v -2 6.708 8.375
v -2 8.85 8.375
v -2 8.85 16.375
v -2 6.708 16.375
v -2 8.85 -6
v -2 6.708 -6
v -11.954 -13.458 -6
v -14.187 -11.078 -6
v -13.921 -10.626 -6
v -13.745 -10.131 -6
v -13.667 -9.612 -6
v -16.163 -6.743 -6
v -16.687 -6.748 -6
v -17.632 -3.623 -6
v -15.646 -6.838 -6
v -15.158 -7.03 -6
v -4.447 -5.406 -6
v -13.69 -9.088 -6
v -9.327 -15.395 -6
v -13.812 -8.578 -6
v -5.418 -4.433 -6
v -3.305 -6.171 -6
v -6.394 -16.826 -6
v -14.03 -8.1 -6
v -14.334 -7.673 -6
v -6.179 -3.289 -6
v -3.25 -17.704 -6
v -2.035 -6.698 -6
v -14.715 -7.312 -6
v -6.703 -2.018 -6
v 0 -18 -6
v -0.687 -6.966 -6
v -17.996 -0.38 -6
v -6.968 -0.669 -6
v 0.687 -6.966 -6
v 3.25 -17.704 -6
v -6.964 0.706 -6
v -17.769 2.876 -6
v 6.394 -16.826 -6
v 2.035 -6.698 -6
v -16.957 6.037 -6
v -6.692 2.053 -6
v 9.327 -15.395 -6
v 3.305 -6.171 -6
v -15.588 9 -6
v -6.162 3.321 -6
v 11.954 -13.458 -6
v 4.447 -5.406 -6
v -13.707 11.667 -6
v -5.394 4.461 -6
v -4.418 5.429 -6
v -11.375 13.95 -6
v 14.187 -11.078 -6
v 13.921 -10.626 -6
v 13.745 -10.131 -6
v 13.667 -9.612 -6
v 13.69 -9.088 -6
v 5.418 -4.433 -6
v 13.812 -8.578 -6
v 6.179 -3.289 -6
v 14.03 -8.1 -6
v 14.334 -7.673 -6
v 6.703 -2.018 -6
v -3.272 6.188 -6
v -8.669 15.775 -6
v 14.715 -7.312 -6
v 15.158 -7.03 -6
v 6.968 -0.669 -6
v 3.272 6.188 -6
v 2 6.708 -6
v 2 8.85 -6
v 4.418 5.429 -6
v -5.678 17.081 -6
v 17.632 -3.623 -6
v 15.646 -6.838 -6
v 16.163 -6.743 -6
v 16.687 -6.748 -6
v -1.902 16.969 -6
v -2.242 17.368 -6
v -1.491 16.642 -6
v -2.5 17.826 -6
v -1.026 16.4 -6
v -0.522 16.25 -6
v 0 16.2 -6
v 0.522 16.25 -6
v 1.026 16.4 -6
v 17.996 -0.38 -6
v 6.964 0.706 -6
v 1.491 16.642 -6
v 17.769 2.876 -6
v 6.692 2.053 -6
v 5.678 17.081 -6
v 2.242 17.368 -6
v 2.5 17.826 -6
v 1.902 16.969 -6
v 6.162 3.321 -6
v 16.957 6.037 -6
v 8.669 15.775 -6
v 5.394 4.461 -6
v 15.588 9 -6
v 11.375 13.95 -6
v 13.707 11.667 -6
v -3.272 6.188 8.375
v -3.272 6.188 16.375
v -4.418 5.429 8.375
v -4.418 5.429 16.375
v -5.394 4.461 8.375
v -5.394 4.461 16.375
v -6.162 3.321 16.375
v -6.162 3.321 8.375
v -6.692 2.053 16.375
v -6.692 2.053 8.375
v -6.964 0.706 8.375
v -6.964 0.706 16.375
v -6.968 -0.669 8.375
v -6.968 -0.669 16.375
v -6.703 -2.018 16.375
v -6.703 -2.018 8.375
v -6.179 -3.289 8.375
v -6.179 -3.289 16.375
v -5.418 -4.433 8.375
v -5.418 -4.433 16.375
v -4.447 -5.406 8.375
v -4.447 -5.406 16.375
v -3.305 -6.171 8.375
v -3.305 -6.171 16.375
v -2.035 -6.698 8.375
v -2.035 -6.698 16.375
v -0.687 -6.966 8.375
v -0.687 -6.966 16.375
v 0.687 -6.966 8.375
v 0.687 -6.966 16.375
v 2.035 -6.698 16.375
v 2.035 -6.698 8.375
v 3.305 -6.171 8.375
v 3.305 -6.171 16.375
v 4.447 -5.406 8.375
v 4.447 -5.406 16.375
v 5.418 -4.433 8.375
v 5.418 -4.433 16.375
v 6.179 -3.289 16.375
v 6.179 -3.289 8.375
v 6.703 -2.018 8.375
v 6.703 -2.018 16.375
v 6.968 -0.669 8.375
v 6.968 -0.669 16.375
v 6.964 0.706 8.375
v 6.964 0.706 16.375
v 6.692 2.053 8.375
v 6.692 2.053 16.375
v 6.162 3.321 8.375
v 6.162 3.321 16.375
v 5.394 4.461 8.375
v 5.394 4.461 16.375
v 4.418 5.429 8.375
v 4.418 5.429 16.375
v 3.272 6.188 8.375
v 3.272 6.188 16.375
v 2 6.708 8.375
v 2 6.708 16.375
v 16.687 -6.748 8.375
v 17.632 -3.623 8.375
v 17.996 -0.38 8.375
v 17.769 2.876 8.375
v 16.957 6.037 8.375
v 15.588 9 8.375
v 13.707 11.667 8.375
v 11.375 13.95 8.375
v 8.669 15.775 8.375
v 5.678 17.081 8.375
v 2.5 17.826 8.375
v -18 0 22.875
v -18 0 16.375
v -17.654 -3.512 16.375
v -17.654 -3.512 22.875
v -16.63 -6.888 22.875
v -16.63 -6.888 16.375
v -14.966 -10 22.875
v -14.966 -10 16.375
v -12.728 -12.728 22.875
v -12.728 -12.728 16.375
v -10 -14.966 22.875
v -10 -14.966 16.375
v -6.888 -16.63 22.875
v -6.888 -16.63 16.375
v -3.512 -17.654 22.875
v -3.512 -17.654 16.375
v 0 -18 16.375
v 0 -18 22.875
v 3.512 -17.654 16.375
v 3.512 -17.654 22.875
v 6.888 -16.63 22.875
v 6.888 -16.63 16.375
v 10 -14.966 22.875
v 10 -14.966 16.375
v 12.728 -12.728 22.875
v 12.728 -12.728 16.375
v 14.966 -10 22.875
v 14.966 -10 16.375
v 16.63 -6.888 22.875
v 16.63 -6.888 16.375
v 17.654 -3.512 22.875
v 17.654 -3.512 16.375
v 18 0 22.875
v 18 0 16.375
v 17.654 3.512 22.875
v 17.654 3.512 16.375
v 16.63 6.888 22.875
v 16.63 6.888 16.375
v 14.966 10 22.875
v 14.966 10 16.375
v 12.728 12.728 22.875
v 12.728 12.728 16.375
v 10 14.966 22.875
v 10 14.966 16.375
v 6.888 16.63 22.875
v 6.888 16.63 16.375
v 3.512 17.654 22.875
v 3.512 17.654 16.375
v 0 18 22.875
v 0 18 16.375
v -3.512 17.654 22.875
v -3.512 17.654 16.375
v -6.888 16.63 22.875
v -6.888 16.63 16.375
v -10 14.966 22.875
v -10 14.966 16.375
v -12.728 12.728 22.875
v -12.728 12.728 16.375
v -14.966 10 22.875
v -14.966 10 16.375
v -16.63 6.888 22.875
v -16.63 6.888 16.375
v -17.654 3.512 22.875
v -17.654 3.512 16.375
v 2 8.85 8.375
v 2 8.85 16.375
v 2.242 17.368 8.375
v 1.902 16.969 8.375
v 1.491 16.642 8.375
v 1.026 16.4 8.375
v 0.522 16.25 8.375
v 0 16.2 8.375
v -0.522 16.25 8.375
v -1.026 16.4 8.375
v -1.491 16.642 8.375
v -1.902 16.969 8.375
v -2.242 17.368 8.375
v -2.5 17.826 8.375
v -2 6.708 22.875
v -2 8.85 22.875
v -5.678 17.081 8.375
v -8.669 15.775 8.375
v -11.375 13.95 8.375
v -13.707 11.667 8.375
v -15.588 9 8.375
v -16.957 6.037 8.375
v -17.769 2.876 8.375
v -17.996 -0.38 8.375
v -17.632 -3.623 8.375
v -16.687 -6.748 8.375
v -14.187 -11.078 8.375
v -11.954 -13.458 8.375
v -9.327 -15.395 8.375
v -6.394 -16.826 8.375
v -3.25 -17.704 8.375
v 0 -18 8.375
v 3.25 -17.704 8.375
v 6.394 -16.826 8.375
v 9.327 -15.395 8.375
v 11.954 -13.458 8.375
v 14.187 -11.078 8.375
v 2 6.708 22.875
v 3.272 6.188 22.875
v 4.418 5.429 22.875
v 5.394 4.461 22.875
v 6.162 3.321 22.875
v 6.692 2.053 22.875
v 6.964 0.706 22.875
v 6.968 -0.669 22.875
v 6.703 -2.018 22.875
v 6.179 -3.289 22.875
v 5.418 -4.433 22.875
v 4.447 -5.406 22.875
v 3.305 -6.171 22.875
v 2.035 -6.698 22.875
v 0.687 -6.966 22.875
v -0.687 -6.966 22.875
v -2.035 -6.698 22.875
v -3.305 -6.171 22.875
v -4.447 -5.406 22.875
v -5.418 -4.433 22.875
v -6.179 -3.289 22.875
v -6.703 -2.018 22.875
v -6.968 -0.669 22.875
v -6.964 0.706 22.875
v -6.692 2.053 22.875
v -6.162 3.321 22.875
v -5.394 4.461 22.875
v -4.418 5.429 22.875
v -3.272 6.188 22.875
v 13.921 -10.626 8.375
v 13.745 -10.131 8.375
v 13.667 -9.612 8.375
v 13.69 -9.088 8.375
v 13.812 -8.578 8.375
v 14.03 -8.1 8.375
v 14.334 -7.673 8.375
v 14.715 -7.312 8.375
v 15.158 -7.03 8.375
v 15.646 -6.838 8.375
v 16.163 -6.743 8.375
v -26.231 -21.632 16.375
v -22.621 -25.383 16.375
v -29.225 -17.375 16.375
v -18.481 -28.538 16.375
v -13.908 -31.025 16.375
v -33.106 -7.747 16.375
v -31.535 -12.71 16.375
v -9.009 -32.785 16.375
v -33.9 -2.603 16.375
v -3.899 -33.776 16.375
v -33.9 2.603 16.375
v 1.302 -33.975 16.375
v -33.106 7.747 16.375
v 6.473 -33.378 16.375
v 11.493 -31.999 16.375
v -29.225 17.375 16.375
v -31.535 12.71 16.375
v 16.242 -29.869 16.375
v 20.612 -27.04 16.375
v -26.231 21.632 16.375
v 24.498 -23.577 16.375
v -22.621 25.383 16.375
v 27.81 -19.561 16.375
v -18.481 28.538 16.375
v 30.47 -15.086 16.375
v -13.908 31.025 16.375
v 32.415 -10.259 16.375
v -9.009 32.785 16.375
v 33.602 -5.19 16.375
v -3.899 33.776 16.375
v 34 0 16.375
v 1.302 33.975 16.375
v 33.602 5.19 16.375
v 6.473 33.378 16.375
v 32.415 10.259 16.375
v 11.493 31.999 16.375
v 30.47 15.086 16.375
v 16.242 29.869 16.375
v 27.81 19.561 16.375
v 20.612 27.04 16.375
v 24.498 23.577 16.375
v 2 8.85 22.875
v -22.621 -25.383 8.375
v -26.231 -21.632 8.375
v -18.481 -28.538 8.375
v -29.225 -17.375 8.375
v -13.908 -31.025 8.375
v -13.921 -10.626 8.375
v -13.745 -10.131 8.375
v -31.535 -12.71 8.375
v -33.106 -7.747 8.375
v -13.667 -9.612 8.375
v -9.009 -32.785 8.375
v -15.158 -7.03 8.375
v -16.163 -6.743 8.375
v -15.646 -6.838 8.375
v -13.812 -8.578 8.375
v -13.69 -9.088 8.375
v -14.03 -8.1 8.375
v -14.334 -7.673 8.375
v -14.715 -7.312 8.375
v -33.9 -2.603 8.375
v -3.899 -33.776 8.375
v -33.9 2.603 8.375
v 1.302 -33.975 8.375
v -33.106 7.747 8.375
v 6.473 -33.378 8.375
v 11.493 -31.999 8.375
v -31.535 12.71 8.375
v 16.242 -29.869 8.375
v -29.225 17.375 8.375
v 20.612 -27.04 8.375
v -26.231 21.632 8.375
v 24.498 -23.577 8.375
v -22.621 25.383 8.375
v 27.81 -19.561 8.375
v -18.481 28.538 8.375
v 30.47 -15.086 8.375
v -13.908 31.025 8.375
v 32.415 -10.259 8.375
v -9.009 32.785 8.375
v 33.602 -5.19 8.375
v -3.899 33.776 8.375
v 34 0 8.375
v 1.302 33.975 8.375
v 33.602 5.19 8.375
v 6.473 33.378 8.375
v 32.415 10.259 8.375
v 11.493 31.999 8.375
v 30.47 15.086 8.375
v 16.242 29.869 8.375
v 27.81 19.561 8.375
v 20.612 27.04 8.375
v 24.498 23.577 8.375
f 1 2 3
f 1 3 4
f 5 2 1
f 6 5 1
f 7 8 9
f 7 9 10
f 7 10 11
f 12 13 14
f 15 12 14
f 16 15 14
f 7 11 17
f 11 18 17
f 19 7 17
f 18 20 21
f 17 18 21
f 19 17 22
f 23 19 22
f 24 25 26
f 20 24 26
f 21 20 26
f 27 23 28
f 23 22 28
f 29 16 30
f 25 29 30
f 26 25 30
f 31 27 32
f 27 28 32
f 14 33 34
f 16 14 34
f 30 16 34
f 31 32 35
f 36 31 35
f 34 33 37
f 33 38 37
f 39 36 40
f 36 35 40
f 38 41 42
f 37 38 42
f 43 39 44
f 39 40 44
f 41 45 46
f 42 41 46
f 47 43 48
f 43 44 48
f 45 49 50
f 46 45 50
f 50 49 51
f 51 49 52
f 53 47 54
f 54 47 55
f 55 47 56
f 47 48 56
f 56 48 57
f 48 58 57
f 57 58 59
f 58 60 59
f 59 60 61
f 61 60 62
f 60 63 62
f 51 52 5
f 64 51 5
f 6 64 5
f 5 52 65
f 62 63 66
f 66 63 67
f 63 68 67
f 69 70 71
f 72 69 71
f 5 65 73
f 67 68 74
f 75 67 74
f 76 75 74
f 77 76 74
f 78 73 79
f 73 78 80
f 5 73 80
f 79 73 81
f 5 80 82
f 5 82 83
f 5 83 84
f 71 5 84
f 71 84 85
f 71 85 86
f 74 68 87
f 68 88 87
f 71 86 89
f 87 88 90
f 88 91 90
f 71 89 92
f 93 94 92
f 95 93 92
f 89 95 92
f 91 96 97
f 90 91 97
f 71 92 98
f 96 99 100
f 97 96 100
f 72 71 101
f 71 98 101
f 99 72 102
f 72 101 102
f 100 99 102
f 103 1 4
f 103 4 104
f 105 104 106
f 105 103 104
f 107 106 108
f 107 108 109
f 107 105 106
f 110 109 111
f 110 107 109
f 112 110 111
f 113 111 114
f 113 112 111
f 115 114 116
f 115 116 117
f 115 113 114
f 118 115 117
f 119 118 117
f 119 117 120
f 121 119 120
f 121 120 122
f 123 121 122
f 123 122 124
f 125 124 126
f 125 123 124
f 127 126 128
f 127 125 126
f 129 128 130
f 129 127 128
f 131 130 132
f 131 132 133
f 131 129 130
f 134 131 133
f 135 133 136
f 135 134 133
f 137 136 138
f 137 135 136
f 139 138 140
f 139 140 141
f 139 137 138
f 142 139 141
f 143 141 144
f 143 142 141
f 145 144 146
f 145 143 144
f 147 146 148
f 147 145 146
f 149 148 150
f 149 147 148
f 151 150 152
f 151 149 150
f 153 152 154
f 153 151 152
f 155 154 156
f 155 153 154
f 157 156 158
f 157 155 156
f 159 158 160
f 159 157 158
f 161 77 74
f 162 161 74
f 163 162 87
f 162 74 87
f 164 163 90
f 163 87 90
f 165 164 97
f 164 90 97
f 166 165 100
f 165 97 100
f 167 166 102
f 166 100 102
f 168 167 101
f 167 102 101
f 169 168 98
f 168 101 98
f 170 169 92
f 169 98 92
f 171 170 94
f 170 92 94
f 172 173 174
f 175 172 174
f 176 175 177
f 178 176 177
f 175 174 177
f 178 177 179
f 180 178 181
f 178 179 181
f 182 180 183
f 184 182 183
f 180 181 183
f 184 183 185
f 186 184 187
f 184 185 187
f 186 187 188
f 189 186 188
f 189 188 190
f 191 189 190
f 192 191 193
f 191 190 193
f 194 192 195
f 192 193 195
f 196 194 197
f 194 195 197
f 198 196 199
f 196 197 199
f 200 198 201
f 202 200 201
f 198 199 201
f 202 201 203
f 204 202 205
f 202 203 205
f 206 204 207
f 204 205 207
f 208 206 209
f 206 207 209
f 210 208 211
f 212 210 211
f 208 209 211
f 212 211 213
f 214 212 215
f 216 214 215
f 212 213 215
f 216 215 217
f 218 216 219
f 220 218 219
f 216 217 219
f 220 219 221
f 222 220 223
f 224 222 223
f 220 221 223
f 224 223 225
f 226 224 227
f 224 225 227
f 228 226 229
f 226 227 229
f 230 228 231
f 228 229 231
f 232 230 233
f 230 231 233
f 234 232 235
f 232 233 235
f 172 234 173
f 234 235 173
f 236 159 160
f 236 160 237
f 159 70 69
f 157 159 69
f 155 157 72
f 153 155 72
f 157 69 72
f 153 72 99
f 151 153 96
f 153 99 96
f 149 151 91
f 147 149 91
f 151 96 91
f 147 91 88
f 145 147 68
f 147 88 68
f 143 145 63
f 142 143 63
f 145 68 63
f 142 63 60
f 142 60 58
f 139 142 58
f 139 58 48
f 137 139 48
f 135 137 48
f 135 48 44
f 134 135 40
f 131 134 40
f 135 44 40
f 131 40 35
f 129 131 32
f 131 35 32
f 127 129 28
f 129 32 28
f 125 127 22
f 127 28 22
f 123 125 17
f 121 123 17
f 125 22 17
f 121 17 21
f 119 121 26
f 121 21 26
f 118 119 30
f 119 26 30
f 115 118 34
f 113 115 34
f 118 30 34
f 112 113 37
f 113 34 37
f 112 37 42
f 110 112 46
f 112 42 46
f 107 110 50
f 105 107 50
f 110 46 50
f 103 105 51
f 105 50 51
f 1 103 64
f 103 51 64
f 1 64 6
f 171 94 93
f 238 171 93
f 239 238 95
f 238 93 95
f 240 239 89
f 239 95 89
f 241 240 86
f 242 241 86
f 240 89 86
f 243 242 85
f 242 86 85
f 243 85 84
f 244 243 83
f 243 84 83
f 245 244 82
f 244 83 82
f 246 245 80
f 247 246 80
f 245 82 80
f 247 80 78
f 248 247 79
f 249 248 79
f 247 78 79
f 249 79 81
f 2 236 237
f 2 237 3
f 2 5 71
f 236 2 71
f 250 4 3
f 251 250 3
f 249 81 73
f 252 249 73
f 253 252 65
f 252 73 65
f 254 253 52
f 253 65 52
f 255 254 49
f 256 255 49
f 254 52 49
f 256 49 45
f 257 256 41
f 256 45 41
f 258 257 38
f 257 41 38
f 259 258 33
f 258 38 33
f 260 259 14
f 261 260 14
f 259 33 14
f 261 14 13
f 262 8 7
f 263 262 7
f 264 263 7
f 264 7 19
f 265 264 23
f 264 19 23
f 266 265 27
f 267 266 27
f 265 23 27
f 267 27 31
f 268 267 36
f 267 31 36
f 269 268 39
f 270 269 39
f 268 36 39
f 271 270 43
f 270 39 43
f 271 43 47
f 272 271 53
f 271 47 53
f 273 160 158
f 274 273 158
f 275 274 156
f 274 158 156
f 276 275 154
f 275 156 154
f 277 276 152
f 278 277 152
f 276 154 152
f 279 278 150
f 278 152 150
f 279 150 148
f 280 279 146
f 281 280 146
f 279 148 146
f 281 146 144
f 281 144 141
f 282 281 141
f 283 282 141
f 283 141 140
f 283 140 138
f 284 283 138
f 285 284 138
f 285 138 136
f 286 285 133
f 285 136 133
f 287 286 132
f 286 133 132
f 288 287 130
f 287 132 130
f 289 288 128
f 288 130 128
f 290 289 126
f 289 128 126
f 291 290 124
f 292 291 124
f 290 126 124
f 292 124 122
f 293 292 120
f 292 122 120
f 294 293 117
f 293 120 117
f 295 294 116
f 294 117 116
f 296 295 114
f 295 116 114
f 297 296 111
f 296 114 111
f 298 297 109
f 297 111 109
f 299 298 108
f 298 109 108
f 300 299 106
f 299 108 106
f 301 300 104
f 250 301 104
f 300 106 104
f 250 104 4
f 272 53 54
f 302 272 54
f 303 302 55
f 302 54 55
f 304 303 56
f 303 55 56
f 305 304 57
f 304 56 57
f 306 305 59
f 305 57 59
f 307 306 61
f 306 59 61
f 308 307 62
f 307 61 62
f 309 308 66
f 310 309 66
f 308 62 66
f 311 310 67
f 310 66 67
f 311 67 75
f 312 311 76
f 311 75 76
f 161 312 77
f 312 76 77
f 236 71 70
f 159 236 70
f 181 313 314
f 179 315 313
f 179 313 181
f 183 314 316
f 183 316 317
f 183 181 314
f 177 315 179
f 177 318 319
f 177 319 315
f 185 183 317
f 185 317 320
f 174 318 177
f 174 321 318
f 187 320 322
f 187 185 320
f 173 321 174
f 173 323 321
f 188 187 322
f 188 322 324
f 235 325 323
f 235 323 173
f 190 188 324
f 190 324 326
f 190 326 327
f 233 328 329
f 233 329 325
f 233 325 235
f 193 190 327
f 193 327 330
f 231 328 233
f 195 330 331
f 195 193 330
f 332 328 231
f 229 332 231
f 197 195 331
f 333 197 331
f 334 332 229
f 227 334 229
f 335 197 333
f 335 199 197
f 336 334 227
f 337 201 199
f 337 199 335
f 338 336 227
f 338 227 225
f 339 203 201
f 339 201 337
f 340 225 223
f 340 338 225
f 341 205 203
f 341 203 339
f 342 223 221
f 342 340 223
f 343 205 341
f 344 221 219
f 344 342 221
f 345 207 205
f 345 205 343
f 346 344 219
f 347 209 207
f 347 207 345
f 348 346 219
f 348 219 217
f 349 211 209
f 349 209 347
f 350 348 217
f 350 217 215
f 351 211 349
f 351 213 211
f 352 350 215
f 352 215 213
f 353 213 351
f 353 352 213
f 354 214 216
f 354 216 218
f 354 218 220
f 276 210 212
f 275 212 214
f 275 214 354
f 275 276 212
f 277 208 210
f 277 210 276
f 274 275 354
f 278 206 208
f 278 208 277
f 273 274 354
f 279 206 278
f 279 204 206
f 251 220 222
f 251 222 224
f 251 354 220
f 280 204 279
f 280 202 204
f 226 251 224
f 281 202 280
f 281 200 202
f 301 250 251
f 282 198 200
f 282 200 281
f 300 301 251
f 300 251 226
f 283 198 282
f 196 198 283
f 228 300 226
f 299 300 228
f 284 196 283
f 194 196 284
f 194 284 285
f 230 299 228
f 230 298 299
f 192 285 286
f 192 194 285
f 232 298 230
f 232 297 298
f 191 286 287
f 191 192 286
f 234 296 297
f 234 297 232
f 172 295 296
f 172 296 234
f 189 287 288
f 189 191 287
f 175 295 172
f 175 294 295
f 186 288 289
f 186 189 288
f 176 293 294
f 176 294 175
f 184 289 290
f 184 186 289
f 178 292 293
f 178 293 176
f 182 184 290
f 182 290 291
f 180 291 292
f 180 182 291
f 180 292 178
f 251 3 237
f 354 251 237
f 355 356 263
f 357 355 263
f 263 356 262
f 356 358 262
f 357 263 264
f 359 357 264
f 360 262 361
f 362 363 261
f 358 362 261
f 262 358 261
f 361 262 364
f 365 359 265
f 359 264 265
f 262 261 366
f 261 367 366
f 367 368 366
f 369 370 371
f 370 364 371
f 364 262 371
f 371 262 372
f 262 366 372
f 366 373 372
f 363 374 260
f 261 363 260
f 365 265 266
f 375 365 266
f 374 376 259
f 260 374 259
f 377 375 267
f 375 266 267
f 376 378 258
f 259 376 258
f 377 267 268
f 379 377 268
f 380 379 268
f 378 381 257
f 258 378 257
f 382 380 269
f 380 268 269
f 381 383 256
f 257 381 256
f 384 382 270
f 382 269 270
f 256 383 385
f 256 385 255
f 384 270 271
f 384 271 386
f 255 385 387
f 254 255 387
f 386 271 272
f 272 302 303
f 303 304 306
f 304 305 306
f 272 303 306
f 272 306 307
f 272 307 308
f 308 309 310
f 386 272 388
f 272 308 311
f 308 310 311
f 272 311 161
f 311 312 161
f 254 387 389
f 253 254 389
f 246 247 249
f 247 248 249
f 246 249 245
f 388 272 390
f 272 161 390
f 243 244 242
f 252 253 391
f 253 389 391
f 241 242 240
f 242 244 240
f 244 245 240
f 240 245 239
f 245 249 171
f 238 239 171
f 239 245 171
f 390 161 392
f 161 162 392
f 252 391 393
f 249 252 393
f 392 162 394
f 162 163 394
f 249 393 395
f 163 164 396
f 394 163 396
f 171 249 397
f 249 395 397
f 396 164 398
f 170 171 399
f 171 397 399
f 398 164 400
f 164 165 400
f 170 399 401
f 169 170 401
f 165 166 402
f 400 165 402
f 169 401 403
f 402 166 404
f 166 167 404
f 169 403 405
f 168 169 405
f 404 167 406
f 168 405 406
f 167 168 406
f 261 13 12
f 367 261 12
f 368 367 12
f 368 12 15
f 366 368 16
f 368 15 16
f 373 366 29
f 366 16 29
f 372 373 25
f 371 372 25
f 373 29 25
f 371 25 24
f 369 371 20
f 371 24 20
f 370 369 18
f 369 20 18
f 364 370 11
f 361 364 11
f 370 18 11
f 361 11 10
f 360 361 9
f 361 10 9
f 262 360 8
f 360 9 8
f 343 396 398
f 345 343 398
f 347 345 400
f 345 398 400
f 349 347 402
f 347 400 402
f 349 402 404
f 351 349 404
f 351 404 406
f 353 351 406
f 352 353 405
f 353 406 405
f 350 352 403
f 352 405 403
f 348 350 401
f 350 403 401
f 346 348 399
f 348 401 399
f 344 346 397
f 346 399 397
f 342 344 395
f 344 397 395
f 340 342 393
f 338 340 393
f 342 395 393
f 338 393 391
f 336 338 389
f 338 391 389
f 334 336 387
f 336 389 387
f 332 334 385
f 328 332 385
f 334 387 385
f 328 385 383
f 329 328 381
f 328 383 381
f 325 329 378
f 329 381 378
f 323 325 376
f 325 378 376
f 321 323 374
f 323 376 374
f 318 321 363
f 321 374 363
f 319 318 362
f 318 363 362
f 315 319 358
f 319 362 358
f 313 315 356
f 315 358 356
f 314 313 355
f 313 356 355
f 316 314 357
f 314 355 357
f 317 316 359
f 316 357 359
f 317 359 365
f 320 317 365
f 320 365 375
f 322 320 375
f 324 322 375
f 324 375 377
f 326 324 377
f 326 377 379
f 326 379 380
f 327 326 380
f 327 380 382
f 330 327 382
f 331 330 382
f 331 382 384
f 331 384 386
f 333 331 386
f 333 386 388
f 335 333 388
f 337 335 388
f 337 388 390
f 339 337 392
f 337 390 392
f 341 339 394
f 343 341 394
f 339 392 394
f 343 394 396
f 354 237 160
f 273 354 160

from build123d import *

# Parameters (mm, degrees)
EXTRUDE_START   = -6
EXTRUDE_1_DEPTH = 14.374594
SKETCH_3_R      = 34
EXTRUDE_2_DEPTH = 8
SKETCH_5_R      = 18
EXTRUDE_3_DEPTH = 6.5


with BuildPart() as part:
    # Эскиз1 → Вытянуть1 (new body)
    with BuildSketch(Plane.XY.offset(EXTRUDE_START)):
        with BuildLine():
            ThreePointArc((-2.5, 17.82554347), (-15.588457268, 9), (-16.687373481, -6.747708226))
            ThreePointArc((-16.687373481, -6.747708226), (-14.029608141, -8.099998037), (-14.187373481, -11.077835244))
            ThreePointArc((-14.187373481, -11.077835244), (0, -18), (14.187373481, -11.077835244))
            ThreePointArc((14.187373481, -11.077835244), (14.029608141, -8.099998037), (16.687373481, -6.747708226))
            ThreePointArc((16.687373481, -6.747708226), (15.588457268, 9), (2.5, 17.82554347))
            ThreePointArc((2.5, 17.82554347), (0, 16.199996074), (-2.5, 17.82554347))
        make_face()
        with BuildLine():
            Line((-2, 8.85), (2, 8.85))
            Line((2, 8.85), (2, 6.708203932))
            ThreePointArc((2, 6.708203932), (0, -7), (-2, 6.708203932))
            Line((-2, 6.708203932), (-2, 8.85))
        make_face(mode=Mode.SUBTRACT)
    extrude(amount=EXTRUDE_1_DEPTH)

    # Эскиз3 → Вытянуть2 (add)
    with BuildSketch(Plane.XY.offset(8.374593773)):
        Circle(SKETCH_3_R)
        with BuildLine():
            Line((-2, 8.85), (-2, 6.708203932))
            ThreePointArc((-2, 6.708203932), (0, -7), (2, 6.708203932))
            Line((2, 6.708203932), (2, 8.85))
            Line((2, 8.85), (-2, 8.85))
        make_face(mode=Mode.SUBTRACT)
    extrude(amount=EXTRUDE_2_DEPTH)

    # Эскиз5 → Вытянуть3 (add)
    with BuildSketch(Plane.XY.offset(16.374593773)):
        with Locations(Location((0, 0, 0), (0, 0, 180))):
            Circle(SKETCH_5_R)
        with BuildLine():
            Line((-2, 6.708203932), (-2, 8.85))
            Line((-2, 8.85), (2, 8.85))
            Line((2, 8.85), (2, 6.708203932))
            ThreePointArc((2, 6.708203932), (0, -7), (-2, 6.708203932))
        make_face(mode=Mode.SUBTRACT)
    extrude(amount=EXTRUDE_3_DEPTH)


solid = part.part
